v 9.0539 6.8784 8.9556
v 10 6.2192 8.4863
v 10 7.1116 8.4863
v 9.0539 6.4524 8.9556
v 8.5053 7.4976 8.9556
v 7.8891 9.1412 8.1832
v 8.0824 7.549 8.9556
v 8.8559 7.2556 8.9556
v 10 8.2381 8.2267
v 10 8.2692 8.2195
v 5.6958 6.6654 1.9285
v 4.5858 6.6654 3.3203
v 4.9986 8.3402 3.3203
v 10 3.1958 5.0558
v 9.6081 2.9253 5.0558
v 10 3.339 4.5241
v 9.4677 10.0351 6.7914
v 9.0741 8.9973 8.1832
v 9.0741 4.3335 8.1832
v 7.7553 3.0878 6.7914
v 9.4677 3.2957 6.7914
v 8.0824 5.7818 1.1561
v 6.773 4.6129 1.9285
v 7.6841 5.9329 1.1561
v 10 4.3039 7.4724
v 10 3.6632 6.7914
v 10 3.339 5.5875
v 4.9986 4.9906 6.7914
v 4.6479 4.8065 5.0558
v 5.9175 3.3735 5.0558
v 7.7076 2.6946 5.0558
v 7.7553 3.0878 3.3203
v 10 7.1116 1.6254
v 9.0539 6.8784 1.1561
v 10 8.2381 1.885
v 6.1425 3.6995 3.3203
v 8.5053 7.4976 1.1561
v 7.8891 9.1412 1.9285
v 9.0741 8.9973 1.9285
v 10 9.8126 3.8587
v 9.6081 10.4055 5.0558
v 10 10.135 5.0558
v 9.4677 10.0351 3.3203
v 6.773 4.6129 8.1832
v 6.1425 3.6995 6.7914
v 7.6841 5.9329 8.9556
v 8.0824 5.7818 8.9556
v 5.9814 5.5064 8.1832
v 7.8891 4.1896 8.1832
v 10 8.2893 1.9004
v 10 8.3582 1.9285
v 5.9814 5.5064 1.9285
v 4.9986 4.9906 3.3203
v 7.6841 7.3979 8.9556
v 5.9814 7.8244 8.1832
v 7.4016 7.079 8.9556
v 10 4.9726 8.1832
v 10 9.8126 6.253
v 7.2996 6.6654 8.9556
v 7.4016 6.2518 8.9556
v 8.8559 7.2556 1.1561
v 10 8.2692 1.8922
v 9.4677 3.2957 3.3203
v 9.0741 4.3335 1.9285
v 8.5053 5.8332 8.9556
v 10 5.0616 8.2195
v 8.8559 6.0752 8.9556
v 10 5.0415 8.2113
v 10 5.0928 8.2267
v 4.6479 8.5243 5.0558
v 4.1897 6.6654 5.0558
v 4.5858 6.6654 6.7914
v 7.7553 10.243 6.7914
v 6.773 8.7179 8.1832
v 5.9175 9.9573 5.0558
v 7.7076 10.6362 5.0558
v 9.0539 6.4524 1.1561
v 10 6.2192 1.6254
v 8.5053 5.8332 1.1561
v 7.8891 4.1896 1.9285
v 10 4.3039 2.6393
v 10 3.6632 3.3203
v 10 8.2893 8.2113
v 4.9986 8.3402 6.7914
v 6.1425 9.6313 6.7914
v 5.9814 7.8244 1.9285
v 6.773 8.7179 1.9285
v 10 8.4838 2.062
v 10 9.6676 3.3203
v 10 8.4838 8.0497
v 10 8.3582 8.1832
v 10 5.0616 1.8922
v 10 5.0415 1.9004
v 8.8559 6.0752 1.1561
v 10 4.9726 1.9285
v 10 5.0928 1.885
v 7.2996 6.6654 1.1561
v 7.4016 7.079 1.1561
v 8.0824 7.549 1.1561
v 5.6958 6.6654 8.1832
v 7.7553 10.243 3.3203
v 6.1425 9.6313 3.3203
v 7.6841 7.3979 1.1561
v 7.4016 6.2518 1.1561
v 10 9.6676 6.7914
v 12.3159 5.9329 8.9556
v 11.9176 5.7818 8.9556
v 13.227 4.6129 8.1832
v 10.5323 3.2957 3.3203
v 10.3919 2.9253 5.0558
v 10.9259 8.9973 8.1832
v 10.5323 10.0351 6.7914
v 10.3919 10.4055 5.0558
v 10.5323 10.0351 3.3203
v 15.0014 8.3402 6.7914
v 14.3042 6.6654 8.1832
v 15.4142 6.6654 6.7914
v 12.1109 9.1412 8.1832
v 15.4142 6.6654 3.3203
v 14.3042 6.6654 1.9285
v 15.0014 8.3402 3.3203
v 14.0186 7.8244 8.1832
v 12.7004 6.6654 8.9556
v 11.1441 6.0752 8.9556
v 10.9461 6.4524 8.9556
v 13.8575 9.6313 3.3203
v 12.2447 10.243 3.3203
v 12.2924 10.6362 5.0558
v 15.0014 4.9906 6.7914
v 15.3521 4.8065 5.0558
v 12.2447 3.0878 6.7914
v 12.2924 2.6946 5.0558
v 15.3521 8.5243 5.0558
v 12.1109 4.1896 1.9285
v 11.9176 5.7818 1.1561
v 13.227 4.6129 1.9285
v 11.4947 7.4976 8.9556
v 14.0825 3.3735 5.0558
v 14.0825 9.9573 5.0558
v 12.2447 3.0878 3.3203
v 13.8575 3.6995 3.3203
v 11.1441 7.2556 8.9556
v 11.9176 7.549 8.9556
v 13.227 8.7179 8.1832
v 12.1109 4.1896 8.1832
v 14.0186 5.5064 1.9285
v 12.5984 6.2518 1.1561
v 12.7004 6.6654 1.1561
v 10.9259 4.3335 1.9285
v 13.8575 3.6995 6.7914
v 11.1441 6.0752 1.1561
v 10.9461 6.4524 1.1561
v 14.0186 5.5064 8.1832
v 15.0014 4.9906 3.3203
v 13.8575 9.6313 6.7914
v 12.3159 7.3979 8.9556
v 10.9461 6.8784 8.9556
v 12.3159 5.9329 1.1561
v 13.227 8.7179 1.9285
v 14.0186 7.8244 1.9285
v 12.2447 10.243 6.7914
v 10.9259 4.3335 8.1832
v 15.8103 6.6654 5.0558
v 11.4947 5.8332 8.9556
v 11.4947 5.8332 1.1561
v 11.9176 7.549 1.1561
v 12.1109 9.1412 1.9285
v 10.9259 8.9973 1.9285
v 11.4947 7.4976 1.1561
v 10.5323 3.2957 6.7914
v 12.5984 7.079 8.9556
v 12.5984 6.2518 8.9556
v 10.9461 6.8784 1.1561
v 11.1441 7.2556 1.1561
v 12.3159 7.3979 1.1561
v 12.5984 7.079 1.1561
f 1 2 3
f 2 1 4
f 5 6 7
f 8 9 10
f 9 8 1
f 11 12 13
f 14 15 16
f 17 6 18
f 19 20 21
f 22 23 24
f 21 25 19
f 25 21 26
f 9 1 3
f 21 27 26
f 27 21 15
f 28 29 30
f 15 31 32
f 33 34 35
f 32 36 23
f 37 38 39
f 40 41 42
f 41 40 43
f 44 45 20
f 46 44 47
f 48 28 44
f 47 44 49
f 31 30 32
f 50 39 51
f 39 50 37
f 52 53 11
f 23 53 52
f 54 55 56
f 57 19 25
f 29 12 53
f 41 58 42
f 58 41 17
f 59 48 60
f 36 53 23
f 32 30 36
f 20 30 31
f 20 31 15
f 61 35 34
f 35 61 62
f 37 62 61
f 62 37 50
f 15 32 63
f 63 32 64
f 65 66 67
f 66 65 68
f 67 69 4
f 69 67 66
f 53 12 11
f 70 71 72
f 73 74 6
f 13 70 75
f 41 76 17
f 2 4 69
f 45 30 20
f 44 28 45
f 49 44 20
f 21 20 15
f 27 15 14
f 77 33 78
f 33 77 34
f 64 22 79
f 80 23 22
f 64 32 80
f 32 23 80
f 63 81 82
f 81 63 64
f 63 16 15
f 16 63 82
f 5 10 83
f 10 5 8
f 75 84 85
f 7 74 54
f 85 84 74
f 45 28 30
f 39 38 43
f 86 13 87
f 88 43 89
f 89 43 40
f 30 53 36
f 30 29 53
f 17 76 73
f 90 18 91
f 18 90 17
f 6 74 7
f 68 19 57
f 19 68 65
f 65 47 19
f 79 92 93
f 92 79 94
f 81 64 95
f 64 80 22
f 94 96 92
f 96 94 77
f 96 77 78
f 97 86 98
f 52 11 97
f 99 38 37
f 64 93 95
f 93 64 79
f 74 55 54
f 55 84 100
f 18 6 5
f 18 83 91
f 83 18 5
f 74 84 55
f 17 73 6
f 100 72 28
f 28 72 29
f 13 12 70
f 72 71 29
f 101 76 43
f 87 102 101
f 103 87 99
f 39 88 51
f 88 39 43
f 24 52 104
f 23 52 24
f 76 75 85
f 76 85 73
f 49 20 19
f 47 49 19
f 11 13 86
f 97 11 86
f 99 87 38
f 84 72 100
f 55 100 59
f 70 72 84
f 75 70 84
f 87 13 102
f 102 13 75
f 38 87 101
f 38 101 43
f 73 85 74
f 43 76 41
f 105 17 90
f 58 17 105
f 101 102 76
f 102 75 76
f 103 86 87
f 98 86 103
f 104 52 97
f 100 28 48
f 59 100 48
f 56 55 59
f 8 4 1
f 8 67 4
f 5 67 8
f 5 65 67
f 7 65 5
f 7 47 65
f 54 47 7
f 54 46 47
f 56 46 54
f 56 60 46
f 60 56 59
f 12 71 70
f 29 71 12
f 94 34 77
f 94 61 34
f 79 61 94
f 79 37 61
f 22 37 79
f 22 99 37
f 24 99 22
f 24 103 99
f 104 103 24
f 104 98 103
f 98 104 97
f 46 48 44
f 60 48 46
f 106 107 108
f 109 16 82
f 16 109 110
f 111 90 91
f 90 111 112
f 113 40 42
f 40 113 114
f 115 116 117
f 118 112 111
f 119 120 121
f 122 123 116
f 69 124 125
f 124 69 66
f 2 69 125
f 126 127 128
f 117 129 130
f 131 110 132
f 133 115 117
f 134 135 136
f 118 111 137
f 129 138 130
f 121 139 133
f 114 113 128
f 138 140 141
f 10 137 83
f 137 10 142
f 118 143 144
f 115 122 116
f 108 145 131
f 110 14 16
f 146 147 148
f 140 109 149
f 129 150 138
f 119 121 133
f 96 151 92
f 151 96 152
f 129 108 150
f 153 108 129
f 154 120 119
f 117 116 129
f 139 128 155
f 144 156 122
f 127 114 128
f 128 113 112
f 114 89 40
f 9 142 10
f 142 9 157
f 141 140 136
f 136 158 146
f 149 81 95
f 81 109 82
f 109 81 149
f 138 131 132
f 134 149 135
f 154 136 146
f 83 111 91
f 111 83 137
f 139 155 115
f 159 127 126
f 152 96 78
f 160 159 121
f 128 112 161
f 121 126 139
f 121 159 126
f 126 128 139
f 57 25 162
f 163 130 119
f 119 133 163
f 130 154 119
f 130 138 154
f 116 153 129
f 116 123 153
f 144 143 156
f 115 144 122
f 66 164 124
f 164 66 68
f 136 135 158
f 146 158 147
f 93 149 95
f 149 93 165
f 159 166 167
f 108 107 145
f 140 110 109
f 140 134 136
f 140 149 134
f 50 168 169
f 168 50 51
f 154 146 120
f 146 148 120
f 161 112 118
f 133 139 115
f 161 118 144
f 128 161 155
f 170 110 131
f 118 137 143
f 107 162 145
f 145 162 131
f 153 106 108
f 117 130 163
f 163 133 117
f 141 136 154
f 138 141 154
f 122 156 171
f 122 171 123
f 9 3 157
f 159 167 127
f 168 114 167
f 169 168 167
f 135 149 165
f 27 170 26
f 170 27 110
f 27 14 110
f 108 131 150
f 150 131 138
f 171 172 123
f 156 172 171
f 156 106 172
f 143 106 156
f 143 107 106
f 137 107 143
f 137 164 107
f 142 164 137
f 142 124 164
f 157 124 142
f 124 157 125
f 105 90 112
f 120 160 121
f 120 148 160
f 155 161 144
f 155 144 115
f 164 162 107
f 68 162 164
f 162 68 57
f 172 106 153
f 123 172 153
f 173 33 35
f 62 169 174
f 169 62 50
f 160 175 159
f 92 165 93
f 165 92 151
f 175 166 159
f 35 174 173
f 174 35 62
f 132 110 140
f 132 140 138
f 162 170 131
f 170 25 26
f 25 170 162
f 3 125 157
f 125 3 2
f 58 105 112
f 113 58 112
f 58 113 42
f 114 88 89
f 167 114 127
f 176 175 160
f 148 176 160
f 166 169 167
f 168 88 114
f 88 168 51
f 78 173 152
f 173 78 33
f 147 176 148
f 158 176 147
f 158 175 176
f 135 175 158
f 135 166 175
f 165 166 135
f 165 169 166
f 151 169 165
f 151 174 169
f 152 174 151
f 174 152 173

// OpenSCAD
union(){
    translate(v=[0, 0, 0]){
        hull(){
            union(){
                mirror([1, 0, 0]){
                    union(){
                        mirror([1, 0, 0]){
                            hull(){
                                union(){
                                    mirror([1, 0, 0]){
                                        intersection(){
                                            linear_extrude(height=10, twist=120){
                                                polygon(points=[[14.343680834046534, 18.02438283013549], [19.992629257493906, 10.799994066890449], [17.091427027255502, 9.919720790240149], [17.693492876407475, 6.889464741562172], [9.569318085689478, 7.990794711706448], [8.522182653819353, 3.3116138733020306]]);
                                            };
                                        };
                                    };
                                    intersection(){
                                        linear_extrude(height=10, twist=120){
                                            polygon(points=[[14.343680834046534, 18.02438283013549], [19.992629257493906, 10.799994066890449], [17.091427027255502, 9.919720790240149], [17.693492876407475, 6.889464741562172], [9.569318085689478, 7.990794711706448], [8.522182653819353, 3.3116138733020306]]);
                                        };
                                    };
                                };
                            };
                        };
                        hull(){
                            union(){
                                mirror([1, 0, 0]){
                                    intersection(){
                                        linear_extrude(height=10, twist=120){
                                            polygon(points=[[14.343680834046534, 18.02438283013549], [19.992629257493906, 10.799994066890449], [17.091427027255502, 9.919720790240149], [17.693492876407475, 6.889464741562172], [9.569318085689478, 7.990794711706448], [8.522182653819353, 3.3116138733020306]]);
                                        };
                                    };
                                };
                                intersection(){
                                    linear_extrude(height=10, twist=120){
                                        polygon(points=[[14.343680834046534, 18.02438283013549], [19.992629257493906, 10.799994066890449], [17.091427027255502, 9.919720790240149], [17.693492876407475, 6.889464741562172], [9.569318085689478, 7.990794711706448], [8.522182653819353, 3.3116138733020306]]);
                                    };
                                };
                            };
                        };
                    };
                };
                union(){
                    mirror([1, 0, 0]){
                        hull(){
                            union(){
                                mirror([1, 0, 0]){
                                    intersection(){
                                        linear_extrude(height=10, twist=120){
                                            polygon(points=[[14.343680834046534, 18.02438283013549], [19.992629257493906, 10.799994066890449], [17.091427027255502, 9.919720790240149], [17.693492876407475, 6.889464741562172], [9.569318085689478, 7.990794711706448], [8.522182653819353, 3.3116138733020306]]);
                                        };
                                    };
                                };
                                intersection(){
                                    linear_extrude(height=10, twist=120){
                                        polygon(points=[[14.343680834046534, 18.02438283013549], [19.992629257493906, 10.799994066890449], [17.091427027255502, 9.919720790240149], [17.693492876407475, 6.889464741562172], [9.569318085689478, 7.990794711706448], [8.522182653819353, 3.3116138733020306]]);
                                    };
                                };
                            };
                        };
                    };
                    hull(){
                        union(){
                            mirror([1, 0, 0]){
                                intersection(){
                                    linear_extrude(height=10, twist=120){
                                        polygon(points=[[14.343680834046534, 18.02438283013549], [19.992629257493906, 10.799994066890449], [17.091427027255502, 9.919720790240149], [17.693492876407475, 6.889464741562172], [9.569318085689478, 7.990794711706448], [8.522182653819353, 3.3116138733020306]]);
                                    };
                                };
                            };
                            intersection(){
                                linear_extrude(height=10, twist=120){
                                    polygon(points=[[14.343680834046534, 18.02438283013549], [19.992629257493906, 10.799994066890449], [17.091427027255502, 9.919720790240149], [17.693492876407475, 6.889464741562172], [9.569318085689478, 7.990794711706448], [8.522182653819353, 3.3116138733020306]]);
                                };
                            };
                        };
                    };
                };
            };
        };
    };
    translate(v=[10, 0, 0]){
        union(){
            translate(v=[0, 0, 0]){
                union(){
                    mirror([1, 0, 0]){
                        translate(v=[1.8102881639808732, 6.665400793169534, 5.0558427256198595]){
                            sphere(r=4);
                        };
                    };
                    translate(v=[1.8102881639808732, 6.665400793169534, 5.0558427256198595]){
                        sphere(r=4);
                    };
                };
            };
        };
    };
};
